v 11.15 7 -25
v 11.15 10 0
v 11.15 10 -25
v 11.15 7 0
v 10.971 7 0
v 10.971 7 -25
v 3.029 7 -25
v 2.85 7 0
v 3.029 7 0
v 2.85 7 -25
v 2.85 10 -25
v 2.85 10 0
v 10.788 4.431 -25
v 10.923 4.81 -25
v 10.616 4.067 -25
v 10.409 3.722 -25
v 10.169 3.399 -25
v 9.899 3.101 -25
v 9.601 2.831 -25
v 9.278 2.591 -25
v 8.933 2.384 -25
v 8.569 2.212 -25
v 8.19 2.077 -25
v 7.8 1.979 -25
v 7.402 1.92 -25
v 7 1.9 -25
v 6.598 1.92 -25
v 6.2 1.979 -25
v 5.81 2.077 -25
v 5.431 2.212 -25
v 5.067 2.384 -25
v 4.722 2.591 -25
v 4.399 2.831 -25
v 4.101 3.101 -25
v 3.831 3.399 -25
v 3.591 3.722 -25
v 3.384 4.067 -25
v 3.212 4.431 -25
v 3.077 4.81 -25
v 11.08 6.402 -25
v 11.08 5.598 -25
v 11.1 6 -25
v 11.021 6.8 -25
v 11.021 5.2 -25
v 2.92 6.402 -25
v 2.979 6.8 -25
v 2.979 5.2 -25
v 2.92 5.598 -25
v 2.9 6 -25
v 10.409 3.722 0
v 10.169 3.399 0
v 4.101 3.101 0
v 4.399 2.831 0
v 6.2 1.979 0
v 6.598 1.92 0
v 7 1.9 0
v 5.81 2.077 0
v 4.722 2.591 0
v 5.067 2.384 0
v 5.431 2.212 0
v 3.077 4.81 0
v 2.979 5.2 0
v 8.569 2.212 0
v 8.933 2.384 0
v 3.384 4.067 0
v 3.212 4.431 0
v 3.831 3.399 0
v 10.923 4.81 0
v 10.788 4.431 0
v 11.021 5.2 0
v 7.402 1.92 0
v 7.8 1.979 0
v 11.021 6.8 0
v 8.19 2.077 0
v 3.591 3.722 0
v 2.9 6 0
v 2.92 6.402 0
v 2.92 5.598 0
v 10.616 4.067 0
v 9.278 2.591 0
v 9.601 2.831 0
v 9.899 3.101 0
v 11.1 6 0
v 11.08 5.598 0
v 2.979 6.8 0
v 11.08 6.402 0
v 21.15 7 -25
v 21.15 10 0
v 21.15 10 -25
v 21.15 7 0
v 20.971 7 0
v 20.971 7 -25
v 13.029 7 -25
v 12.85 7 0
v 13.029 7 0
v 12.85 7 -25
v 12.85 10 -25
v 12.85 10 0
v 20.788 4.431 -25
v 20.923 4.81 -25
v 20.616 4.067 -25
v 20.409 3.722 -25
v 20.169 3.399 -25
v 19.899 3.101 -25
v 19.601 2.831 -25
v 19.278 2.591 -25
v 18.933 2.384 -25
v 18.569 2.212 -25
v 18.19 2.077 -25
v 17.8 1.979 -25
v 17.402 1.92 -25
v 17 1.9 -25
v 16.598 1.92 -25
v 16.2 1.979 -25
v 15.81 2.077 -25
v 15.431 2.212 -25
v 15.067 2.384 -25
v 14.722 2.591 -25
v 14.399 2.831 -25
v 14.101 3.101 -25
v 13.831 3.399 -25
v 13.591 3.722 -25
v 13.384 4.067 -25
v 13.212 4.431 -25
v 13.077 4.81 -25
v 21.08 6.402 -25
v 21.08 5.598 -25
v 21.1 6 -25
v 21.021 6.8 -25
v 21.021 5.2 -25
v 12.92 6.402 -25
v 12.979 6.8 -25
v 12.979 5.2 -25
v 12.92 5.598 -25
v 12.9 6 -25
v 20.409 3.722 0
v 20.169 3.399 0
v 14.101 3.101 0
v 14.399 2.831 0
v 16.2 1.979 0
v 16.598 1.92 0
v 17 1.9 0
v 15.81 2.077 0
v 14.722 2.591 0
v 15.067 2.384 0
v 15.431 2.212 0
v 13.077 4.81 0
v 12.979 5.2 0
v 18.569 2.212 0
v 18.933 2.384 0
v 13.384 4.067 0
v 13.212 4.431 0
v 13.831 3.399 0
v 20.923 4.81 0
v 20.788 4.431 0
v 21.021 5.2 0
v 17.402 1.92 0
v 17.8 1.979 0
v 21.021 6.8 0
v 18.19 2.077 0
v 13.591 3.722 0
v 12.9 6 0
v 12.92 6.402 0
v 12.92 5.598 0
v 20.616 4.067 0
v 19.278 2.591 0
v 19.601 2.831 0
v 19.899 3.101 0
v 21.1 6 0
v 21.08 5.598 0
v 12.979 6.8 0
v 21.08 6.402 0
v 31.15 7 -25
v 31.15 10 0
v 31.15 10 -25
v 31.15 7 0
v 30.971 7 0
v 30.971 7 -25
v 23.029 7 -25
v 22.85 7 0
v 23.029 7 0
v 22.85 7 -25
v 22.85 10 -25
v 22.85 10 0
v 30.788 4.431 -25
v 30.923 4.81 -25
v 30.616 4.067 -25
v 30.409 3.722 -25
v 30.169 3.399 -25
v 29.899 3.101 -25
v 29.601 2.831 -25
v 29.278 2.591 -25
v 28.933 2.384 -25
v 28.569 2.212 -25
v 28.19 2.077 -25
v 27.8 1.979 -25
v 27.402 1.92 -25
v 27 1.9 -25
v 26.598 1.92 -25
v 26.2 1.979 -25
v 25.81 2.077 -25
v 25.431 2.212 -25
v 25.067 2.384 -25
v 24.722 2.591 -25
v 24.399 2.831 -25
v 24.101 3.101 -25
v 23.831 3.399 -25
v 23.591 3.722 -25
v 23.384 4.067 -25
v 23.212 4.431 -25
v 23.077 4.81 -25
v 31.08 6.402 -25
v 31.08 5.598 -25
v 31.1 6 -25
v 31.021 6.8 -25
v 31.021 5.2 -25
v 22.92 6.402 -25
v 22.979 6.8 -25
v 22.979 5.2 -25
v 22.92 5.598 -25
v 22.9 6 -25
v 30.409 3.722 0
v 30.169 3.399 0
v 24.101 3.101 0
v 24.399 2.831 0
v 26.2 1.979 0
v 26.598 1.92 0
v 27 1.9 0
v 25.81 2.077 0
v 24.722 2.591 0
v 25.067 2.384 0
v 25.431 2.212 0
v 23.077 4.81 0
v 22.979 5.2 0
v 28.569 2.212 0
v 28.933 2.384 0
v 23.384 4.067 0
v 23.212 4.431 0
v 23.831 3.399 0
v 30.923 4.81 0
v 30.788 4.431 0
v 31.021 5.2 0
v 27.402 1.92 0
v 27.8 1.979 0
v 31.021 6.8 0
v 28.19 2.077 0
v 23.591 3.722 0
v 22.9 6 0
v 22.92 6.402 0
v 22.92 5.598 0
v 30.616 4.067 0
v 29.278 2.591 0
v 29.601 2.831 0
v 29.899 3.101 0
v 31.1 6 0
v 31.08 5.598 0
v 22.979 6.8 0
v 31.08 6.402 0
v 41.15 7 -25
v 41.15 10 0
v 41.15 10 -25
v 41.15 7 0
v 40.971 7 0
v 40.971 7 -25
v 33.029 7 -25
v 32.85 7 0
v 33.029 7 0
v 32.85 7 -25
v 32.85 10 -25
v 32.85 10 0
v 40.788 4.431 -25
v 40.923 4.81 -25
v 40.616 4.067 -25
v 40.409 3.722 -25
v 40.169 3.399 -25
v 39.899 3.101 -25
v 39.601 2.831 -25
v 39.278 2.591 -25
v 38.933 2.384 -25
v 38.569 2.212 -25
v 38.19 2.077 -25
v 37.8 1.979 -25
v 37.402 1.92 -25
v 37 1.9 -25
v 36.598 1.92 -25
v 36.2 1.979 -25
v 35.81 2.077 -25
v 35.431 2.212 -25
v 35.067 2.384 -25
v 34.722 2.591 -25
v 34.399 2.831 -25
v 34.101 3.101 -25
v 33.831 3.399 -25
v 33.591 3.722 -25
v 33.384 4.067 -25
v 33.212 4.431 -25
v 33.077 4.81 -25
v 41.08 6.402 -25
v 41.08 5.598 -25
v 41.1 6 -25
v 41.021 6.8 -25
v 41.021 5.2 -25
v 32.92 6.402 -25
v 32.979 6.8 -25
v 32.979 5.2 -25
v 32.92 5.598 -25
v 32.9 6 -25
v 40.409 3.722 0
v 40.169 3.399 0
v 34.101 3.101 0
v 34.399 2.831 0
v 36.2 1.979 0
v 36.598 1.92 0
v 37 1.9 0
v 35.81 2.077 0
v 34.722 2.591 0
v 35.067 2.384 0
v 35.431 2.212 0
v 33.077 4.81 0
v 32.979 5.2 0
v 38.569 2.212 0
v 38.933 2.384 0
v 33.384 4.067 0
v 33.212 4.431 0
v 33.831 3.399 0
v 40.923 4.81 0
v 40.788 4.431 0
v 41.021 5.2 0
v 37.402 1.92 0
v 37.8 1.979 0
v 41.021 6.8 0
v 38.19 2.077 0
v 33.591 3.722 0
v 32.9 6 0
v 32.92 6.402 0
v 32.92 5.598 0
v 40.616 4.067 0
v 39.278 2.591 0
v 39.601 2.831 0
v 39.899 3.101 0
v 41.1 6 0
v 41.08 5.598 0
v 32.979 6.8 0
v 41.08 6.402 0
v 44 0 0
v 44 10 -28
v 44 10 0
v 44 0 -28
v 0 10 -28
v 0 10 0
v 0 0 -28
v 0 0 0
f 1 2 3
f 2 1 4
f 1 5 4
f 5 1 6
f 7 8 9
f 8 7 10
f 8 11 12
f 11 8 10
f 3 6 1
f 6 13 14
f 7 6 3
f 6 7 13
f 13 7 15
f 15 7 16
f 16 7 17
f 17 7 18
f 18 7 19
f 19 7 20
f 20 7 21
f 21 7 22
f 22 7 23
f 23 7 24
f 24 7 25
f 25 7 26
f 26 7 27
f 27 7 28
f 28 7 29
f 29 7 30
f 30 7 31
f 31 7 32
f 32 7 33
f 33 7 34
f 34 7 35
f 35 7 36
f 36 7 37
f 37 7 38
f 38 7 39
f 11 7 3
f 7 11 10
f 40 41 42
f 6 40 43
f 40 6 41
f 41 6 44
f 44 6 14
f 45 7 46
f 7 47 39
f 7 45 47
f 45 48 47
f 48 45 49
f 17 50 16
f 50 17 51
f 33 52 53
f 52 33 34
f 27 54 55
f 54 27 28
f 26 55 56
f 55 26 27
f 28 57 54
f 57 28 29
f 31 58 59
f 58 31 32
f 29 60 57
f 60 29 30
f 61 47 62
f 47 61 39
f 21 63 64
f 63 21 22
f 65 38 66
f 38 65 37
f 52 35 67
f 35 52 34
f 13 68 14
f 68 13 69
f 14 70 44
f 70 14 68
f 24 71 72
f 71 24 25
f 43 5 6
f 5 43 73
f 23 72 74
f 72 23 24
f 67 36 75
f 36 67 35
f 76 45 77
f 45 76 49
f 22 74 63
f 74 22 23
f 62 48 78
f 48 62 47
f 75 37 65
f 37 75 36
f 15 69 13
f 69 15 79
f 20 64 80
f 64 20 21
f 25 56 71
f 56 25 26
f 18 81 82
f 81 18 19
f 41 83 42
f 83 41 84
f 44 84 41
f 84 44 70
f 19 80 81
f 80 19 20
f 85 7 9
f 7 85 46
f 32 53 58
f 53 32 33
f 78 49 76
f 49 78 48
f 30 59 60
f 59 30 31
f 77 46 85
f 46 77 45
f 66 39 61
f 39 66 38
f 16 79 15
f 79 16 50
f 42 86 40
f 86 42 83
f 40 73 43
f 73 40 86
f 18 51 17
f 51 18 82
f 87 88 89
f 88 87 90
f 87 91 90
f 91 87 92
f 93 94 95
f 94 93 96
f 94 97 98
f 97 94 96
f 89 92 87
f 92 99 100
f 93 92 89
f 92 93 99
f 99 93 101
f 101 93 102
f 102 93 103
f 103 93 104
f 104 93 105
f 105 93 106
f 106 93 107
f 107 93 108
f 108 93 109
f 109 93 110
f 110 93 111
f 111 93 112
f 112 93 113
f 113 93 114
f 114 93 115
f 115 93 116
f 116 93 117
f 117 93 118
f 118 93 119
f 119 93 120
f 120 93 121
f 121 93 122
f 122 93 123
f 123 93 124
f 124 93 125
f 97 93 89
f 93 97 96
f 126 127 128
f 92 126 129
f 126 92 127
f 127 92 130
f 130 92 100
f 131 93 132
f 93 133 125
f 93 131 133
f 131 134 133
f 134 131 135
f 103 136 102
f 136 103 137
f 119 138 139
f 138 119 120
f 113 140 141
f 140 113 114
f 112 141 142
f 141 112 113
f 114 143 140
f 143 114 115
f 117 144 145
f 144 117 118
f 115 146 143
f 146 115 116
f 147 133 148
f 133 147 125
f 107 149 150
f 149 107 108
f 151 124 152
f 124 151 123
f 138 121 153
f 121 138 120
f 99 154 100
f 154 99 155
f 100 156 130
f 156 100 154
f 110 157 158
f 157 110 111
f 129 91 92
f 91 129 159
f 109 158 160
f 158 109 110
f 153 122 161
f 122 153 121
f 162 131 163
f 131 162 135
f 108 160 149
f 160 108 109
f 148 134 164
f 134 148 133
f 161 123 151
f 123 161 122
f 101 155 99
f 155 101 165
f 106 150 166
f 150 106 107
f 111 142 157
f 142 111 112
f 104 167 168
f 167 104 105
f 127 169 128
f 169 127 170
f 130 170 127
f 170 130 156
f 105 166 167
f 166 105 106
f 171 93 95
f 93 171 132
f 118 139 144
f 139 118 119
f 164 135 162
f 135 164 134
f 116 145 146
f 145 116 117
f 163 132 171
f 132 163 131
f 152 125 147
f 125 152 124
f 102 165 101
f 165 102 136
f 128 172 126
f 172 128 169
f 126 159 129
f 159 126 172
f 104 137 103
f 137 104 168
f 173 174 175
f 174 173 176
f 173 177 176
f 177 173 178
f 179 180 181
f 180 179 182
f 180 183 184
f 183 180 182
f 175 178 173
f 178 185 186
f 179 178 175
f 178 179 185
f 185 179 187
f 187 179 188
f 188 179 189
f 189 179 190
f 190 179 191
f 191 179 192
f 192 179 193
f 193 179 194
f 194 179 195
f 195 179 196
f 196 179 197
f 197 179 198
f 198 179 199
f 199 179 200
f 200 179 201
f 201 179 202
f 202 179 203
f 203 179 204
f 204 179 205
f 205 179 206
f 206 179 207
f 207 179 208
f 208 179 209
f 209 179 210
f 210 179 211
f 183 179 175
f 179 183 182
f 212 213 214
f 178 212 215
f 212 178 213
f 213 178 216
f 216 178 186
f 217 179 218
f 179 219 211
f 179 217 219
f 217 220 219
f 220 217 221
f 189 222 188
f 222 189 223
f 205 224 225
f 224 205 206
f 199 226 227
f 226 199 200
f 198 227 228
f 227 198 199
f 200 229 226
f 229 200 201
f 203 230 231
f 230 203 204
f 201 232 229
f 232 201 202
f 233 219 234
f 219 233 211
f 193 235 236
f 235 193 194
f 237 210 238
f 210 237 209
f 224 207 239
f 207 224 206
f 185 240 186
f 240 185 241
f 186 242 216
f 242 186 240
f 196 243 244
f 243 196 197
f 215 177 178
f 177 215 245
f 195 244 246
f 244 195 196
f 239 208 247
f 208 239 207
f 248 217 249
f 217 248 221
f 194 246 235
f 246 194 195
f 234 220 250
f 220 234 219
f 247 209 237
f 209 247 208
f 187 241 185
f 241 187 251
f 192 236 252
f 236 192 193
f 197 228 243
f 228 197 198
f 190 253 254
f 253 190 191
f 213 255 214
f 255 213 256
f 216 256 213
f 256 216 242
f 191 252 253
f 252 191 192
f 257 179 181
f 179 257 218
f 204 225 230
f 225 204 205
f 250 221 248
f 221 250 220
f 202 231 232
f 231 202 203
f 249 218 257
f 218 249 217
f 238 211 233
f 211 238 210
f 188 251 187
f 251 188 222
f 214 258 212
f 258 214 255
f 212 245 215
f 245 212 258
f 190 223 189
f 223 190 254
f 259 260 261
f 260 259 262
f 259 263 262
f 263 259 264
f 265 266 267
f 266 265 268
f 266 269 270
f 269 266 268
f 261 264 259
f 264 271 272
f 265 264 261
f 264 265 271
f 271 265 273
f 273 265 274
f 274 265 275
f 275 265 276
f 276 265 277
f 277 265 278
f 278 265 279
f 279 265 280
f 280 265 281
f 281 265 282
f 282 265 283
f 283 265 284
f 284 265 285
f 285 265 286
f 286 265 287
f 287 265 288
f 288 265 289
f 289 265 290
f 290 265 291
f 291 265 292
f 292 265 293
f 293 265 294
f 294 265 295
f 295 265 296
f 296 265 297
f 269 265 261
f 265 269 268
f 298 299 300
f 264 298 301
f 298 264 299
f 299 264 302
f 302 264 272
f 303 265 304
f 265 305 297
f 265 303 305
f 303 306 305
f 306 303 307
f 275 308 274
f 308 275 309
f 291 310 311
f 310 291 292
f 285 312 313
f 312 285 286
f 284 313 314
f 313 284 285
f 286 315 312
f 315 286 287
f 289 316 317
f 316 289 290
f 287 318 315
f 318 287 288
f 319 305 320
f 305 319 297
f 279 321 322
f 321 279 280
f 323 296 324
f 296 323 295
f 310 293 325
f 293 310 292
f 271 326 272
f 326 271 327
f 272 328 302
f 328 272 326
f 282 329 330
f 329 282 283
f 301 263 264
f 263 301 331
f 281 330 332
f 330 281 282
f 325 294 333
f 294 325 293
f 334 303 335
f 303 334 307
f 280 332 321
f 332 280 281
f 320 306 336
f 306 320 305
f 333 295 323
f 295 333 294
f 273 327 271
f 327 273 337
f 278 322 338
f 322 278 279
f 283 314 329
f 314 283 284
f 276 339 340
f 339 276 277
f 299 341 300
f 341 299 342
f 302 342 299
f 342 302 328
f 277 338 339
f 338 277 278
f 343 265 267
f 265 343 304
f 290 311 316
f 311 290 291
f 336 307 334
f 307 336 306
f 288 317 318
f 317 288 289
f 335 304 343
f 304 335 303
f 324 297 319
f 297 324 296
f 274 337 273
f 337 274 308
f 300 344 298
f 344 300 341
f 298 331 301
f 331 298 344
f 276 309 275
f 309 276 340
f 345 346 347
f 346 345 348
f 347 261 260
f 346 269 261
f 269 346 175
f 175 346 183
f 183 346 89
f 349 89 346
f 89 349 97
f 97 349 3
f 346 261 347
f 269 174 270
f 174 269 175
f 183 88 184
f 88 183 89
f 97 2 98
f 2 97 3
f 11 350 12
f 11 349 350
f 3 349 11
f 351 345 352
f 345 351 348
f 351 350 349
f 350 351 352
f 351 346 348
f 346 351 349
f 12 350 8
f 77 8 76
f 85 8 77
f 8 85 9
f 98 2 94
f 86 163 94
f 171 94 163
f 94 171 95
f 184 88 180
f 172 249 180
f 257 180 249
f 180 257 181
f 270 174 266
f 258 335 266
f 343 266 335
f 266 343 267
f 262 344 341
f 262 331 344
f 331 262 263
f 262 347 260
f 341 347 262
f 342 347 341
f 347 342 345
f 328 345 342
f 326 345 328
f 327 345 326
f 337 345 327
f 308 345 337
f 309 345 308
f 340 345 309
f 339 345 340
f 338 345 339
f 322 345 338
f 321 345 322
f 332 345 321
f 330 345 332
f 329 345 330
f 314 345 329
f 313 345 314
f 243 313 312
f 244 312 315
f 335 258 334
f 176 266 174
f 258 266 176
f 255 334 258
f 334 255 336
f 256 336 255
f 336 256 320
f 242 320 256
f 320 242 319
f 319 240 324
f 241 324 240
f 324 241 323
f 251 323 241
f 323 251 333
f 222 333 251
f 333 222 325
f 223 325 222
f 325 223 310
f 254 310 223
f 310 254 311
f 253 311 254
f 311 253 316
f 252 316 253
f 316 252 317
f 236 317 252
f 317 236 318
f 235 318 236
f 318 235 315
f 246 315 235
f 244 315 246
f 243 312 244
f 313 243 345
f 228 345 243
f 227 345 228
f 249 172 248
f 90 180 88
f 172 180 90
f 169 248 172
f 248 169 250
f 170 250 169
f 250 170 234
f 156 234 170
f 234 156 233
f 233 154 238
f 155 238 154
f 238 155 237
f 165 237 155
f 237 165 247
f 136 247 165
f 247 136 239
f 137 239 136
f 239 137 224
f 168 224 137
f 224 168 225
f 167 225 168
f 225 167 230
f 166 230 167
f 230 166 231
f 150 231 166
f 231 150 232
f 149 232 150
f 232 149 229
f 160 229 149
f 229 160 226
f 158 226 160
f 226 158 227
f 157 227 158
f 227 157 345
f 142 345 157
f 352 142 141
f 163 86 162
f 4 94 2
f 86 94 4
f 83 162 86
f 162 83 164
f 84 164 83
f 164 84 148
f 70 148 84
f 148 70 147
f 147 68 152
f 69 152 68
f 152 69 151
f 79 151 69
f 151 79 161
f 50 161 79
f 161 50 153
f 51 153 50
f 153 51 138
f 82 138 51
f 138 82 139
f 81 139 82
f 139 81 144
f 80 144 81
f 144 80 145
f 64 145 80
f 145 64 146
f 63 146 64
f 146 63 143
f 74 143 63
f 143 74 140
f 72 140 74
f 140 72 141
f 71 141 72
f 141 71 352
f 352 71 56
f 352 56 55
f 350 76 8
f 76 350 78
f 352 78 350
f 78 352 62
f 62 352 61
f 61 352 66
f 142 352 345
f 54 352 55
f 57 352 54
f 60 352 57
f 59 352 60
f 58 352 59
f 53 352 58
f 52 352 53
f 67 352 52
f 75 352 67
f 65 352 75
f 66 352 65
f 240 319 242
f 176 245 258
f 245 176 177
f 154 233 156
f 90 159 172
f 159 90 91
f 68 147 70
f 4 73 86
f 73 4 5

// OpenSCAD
// make printed rod clamps
$fn=64;

module rod(){
	translate([7,25,3+6]) rotate([0,0,0]) cube([8.3,50,4], center=true);
	translate([7,0,6]) rotate([0,90,90]) cylinder(h = 50, r=4.1);

}


module clamp_2x8(){
  difference(){
	 cube([24,28,10]);
  	 translate([0,-25,0]) rod();
	 translate([10,-25,0]) rod();
	}
}

module clamp_4x8(){
	difference(){
 		cube([44,28,10]);
		translate([0,-25,0]) rod();
 		translate([10,-25,0]) rod();
 		translate([20,-25,0]) rod();
 		translate([30,-25,0]) rod();
	}
}

rotate([-90,0,0]) clamp_4x8();
